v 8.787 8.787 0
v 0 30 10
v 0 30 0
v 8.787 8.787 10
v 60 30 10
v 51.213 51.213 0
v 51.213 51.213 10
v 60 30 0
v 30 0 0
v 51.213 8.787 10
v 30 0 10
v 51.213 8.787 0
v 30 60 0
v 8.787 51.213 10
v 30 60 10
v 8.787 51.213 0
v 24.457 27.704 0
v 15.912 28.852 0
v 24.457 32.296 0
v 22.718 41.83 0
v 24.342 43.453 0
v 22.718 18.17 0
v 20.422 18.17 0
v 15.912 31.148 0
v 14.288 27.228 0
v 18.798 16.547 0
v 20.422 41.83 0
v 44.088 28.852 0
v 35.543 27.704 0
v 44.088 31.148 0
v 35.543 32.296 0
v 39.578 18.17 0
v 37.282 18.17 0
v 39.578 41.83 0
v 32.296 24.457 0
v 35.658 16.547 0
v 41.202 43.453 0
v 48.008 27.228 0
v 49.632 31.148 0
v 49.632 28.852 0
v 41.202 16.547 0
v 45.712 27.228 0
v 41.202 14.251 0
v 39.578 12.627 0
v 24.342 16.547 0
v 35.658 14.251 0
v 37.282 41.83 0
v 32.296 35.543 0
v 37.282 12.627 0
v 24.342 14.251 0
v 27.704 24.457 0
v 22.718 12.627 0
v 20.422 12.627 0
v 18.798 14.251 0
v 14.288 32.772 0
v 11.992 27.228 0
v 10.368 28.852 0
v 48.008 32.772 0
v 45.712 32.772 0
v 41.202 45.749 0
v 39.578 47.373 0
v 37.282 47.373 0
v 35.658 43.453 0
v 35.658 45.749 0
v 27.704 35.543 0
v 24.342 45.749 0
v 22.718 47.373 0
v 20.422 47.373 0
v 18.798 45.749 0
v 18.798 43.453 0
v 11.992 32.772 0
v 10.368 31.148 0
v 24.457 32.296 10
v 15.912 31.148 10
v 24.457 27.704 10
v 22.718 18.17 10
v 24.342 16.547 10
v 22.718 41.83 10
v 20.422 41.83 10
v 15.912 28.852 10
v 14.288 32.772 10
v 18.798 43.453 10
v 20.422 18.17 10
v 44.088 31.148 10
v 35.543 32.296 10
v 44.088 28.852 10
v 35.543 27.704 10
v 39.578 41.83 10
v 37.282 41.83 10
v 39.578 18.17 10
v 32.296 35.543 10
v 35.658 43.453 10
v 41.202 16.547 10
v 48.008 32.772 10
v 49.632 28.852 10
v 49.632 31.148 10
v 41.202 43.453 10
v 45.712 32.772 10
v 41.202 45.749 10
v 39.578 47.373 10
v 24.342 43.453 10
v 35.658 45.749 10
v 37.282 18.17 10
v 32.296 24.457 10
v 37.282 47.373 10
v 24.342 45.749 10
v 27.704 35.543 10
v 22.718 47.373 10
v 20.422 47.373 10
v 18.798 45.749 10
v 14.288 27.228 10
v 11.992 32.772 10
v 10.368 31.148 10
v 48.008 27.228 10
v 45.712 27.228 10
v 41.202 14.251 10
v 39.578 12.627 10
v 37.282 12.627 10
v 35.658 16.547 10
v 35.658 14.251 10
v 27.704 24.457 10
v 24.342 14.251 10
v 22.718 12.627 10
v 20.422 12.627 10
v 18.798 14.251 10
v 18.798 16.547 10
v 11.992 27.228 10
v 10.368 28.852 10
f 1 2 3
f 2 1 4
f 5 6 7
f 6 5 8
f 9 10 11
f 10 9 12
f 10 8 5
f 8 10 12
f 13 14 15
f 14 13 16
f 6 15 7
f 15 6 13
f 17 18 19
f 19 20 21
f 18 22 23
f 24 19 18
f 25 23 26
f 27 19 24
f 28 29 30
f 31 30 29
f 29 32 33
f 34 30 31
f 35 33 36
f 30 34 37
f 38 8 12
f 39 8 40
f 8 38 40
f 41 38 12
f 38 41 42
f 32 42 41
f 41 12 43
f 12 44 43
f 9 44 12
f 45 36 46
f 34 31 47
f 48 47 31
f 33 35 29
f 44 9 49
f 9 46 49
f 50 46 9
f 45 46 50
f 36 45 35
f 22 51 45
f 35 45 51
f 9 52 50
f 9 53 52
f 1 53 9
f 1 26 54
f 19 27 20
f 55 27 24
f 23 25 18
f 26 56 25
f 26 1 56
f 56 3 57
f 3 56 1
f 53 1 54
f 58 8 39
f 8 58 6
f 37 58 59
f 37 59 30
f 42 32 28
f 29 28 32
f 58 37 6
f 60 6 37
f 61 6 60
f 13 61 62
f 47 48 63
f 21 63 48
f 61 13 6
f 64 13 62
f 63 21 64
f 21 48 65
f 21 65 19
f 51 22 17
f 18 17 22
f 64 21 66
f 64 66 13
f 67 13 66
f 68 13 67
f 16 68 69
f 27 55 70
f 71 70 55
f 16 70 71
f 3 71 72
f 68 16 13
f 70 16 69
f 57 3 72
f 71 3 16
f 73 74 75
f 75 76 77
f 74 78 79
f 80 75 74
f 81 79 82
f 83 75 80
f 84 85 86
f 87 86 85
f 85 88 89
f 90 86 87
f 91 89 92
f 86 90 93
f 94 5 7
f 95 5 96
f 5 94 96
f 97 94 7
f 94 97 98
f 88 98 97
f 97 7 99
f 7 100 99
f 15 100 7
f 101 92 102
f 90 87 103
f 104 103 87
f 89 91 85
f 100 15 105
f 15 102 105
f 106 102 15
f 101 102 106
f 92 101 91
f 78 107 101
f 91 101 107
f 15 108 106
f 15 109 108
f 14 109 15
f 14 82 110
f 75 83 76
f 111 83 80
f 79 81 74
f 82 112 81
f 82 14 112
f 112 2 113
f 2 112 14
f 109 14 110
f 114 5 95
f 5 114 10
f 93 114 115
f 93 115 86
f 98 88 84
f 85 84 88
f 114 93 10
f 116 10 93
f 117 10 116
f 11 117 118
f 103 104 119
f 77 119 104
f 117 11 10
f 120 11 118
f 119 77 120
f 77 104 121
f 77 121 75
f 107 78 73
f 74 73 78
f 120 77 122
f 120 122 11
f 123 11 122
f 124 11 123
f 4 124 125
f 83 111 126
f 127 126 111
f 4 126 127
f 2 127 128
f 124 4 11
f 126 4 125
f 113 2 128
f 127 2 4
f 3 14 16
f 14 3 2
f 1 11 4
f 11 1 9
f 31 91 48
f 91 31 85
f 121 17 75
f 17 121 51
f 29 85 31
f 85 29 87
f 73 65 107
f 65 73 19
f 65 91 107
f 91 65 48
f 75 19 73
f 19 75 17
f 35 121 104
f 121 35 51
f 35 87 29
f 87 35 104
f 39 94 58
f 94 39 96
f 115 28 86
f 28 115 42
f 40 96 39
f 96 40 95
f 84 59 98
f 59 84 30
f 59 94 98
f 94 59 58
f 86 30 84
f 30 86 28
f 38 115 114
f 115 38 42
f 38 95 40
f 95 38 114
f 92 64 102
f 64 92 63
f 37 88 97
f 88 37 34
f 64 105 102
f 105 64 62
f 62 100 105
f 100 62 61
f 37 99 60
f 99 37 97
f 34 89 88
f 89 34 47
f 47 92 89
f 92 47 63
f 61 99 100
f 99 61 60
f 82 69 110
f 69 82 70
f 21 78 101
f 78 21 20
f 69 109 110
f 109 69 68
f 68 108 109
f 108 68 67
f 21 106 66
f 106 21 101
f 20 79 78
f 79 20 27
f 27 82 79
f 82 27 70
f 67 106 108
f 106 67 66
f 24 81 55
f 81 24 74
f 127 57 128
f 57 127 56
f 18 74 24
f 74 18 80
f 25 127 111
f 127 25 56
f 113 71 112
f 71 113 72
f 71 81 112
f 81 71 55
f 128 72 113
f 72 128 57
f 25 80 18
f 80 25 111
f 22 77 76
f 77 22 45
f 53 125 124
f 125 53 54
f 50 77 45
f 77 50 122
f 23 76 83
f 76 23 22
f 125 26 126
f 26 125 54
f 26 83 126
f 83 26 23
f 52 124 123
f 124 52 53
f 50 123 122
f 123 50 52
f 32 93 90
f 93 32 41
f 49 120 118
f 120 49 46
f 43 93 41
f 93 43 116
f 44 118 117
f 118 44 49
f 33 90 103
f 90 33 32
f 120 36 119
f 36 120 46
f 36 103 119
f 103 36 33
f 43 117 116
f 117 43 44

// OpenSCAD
$fn = 32;

// ----------------------------------------------------------------------
// Polygon plate: 8-gon R30, 6 bolt windows
// ----------------------------------------------------------------------

// --- parameters (mm) ---
sides = 8;                // number of polygon sides
plate_r = 30;             // circumscribed radius of the polygon
bore_r = 6;               // centre bore radius
bolts = 6;                // number of bolt windows
ring_r = 16.86;           // bolt-circle radius
bolt_r = 3;               // bolt window radius
plate_t = 10;             // plate thickness, Z (extrusion height)
fit_tol = 0.1;            // declared fit tolerance (prompt contract)
free_tol = 0.3;           // declared free tolerance (prompt contract)

plate_d = 2 * plate_r;  // circumscribed diameter
bore_d = 2 * bore_r;  // centre bore diameter
bolt_d = 2 * bolt_r;  // bolt window diameter
ring_d = 2 * ring_r;  // bolt-circle diameter

profile = [[60, 30], [51.213, 51.213], [30, 60], [8.787, 51.213], [0, 30], [8.787, 8.787], [30, 0], [51.213, 8.787]];  // primary outline, 8 points, counter clockwise
void_1 = [[35.543, 32.296], [32.296, 35.543], [27.704, 35.543], [24.457, 32.296], [24.457, 27.704], [27.704, 24.457], [32.296, 24.457], [35.543, 27.704]];  // centre bore, 8 points
void_2 = [[49.632, 31.148], [48.008, 32.772], [45.712, 32.772], [44.088, 31.148], [44.088, 28.852], [45.712, 27.228], [48.008, 27.228], [49.632, 28.852]];  // bolt window 1, 8 points
void_3 = [[41.202, 45.749], [39.578, 47.373], [37.282, 47.373], [35.658, 45.749], [35.658, 43.453], [37.282, 41.83], [39.578, 41.83], [41.202, 43.453]];  // bolt window 2, 8 points
void_4 = [[24.342, 45.749], [22.718, 47.373], [20.422, 47.373], [18.798, 45.749], [18.798, 43.453], [20.422, 41.83], [22.718, 41.83], [24.342, 43.453]];  // bolt window 3, 8 points
void_5 = [[15.912, 31.148], [14.288, 32.772], [11.992, 32.772], [10.368, 31.148], [10.368, 28.852], [11.992, 27.228], [14.288, 27.228], [15.912, 28.852]];  // bolt window 4, 8 points
void_6 = [[24.342, 16.547], [22.718, 18.17], [20.422, 18.17], [18.798, 16.547], [18.798, 14.251], [20.422, 12.627], [22.718, 12.627], [24.342, 14.251]];  // bolt window 5, 8 points
void_7 = [[41.202, 16.547], [39.578, 18.17], [37.282, 18.17], [35.658, 16.547], [35.658, 14.251], [37.282, 12.627], [39.578, 12.627], [41.202, 14.251]];  // bolt window 6, 8 points

// --- the one profile operation ---
difference() {
  linear_extrude(height = plate_t) polygon(points = profile);
  translate([0, 0, -1])
    linear_extrude(height = plate_t + 2) polygon(points = void_1);
  translate([0, 0, -1])
    linear_extrude(height = plate_t + 2) polygon(points = void_2);
  translate([0, 0, -1])
    linear_extrude(height = plate_t + 2) polygon(points = void_3);
  translate([0, 0, -1])
    linear_extrude(height = plate_t + 2) polygon(points = void_4);
  translate([0, 0, -1])
    linear_extrude(height = plate_t + 2) polygon(points = void_5);
  translate([0, 0, -1])
    linear_extrude(height = plate_t + 2) polygon(points = void_6);
  translate([0, 0, -1])
    linear_extrude(height = plate_t + 2) polygon(points = void_7);
}
